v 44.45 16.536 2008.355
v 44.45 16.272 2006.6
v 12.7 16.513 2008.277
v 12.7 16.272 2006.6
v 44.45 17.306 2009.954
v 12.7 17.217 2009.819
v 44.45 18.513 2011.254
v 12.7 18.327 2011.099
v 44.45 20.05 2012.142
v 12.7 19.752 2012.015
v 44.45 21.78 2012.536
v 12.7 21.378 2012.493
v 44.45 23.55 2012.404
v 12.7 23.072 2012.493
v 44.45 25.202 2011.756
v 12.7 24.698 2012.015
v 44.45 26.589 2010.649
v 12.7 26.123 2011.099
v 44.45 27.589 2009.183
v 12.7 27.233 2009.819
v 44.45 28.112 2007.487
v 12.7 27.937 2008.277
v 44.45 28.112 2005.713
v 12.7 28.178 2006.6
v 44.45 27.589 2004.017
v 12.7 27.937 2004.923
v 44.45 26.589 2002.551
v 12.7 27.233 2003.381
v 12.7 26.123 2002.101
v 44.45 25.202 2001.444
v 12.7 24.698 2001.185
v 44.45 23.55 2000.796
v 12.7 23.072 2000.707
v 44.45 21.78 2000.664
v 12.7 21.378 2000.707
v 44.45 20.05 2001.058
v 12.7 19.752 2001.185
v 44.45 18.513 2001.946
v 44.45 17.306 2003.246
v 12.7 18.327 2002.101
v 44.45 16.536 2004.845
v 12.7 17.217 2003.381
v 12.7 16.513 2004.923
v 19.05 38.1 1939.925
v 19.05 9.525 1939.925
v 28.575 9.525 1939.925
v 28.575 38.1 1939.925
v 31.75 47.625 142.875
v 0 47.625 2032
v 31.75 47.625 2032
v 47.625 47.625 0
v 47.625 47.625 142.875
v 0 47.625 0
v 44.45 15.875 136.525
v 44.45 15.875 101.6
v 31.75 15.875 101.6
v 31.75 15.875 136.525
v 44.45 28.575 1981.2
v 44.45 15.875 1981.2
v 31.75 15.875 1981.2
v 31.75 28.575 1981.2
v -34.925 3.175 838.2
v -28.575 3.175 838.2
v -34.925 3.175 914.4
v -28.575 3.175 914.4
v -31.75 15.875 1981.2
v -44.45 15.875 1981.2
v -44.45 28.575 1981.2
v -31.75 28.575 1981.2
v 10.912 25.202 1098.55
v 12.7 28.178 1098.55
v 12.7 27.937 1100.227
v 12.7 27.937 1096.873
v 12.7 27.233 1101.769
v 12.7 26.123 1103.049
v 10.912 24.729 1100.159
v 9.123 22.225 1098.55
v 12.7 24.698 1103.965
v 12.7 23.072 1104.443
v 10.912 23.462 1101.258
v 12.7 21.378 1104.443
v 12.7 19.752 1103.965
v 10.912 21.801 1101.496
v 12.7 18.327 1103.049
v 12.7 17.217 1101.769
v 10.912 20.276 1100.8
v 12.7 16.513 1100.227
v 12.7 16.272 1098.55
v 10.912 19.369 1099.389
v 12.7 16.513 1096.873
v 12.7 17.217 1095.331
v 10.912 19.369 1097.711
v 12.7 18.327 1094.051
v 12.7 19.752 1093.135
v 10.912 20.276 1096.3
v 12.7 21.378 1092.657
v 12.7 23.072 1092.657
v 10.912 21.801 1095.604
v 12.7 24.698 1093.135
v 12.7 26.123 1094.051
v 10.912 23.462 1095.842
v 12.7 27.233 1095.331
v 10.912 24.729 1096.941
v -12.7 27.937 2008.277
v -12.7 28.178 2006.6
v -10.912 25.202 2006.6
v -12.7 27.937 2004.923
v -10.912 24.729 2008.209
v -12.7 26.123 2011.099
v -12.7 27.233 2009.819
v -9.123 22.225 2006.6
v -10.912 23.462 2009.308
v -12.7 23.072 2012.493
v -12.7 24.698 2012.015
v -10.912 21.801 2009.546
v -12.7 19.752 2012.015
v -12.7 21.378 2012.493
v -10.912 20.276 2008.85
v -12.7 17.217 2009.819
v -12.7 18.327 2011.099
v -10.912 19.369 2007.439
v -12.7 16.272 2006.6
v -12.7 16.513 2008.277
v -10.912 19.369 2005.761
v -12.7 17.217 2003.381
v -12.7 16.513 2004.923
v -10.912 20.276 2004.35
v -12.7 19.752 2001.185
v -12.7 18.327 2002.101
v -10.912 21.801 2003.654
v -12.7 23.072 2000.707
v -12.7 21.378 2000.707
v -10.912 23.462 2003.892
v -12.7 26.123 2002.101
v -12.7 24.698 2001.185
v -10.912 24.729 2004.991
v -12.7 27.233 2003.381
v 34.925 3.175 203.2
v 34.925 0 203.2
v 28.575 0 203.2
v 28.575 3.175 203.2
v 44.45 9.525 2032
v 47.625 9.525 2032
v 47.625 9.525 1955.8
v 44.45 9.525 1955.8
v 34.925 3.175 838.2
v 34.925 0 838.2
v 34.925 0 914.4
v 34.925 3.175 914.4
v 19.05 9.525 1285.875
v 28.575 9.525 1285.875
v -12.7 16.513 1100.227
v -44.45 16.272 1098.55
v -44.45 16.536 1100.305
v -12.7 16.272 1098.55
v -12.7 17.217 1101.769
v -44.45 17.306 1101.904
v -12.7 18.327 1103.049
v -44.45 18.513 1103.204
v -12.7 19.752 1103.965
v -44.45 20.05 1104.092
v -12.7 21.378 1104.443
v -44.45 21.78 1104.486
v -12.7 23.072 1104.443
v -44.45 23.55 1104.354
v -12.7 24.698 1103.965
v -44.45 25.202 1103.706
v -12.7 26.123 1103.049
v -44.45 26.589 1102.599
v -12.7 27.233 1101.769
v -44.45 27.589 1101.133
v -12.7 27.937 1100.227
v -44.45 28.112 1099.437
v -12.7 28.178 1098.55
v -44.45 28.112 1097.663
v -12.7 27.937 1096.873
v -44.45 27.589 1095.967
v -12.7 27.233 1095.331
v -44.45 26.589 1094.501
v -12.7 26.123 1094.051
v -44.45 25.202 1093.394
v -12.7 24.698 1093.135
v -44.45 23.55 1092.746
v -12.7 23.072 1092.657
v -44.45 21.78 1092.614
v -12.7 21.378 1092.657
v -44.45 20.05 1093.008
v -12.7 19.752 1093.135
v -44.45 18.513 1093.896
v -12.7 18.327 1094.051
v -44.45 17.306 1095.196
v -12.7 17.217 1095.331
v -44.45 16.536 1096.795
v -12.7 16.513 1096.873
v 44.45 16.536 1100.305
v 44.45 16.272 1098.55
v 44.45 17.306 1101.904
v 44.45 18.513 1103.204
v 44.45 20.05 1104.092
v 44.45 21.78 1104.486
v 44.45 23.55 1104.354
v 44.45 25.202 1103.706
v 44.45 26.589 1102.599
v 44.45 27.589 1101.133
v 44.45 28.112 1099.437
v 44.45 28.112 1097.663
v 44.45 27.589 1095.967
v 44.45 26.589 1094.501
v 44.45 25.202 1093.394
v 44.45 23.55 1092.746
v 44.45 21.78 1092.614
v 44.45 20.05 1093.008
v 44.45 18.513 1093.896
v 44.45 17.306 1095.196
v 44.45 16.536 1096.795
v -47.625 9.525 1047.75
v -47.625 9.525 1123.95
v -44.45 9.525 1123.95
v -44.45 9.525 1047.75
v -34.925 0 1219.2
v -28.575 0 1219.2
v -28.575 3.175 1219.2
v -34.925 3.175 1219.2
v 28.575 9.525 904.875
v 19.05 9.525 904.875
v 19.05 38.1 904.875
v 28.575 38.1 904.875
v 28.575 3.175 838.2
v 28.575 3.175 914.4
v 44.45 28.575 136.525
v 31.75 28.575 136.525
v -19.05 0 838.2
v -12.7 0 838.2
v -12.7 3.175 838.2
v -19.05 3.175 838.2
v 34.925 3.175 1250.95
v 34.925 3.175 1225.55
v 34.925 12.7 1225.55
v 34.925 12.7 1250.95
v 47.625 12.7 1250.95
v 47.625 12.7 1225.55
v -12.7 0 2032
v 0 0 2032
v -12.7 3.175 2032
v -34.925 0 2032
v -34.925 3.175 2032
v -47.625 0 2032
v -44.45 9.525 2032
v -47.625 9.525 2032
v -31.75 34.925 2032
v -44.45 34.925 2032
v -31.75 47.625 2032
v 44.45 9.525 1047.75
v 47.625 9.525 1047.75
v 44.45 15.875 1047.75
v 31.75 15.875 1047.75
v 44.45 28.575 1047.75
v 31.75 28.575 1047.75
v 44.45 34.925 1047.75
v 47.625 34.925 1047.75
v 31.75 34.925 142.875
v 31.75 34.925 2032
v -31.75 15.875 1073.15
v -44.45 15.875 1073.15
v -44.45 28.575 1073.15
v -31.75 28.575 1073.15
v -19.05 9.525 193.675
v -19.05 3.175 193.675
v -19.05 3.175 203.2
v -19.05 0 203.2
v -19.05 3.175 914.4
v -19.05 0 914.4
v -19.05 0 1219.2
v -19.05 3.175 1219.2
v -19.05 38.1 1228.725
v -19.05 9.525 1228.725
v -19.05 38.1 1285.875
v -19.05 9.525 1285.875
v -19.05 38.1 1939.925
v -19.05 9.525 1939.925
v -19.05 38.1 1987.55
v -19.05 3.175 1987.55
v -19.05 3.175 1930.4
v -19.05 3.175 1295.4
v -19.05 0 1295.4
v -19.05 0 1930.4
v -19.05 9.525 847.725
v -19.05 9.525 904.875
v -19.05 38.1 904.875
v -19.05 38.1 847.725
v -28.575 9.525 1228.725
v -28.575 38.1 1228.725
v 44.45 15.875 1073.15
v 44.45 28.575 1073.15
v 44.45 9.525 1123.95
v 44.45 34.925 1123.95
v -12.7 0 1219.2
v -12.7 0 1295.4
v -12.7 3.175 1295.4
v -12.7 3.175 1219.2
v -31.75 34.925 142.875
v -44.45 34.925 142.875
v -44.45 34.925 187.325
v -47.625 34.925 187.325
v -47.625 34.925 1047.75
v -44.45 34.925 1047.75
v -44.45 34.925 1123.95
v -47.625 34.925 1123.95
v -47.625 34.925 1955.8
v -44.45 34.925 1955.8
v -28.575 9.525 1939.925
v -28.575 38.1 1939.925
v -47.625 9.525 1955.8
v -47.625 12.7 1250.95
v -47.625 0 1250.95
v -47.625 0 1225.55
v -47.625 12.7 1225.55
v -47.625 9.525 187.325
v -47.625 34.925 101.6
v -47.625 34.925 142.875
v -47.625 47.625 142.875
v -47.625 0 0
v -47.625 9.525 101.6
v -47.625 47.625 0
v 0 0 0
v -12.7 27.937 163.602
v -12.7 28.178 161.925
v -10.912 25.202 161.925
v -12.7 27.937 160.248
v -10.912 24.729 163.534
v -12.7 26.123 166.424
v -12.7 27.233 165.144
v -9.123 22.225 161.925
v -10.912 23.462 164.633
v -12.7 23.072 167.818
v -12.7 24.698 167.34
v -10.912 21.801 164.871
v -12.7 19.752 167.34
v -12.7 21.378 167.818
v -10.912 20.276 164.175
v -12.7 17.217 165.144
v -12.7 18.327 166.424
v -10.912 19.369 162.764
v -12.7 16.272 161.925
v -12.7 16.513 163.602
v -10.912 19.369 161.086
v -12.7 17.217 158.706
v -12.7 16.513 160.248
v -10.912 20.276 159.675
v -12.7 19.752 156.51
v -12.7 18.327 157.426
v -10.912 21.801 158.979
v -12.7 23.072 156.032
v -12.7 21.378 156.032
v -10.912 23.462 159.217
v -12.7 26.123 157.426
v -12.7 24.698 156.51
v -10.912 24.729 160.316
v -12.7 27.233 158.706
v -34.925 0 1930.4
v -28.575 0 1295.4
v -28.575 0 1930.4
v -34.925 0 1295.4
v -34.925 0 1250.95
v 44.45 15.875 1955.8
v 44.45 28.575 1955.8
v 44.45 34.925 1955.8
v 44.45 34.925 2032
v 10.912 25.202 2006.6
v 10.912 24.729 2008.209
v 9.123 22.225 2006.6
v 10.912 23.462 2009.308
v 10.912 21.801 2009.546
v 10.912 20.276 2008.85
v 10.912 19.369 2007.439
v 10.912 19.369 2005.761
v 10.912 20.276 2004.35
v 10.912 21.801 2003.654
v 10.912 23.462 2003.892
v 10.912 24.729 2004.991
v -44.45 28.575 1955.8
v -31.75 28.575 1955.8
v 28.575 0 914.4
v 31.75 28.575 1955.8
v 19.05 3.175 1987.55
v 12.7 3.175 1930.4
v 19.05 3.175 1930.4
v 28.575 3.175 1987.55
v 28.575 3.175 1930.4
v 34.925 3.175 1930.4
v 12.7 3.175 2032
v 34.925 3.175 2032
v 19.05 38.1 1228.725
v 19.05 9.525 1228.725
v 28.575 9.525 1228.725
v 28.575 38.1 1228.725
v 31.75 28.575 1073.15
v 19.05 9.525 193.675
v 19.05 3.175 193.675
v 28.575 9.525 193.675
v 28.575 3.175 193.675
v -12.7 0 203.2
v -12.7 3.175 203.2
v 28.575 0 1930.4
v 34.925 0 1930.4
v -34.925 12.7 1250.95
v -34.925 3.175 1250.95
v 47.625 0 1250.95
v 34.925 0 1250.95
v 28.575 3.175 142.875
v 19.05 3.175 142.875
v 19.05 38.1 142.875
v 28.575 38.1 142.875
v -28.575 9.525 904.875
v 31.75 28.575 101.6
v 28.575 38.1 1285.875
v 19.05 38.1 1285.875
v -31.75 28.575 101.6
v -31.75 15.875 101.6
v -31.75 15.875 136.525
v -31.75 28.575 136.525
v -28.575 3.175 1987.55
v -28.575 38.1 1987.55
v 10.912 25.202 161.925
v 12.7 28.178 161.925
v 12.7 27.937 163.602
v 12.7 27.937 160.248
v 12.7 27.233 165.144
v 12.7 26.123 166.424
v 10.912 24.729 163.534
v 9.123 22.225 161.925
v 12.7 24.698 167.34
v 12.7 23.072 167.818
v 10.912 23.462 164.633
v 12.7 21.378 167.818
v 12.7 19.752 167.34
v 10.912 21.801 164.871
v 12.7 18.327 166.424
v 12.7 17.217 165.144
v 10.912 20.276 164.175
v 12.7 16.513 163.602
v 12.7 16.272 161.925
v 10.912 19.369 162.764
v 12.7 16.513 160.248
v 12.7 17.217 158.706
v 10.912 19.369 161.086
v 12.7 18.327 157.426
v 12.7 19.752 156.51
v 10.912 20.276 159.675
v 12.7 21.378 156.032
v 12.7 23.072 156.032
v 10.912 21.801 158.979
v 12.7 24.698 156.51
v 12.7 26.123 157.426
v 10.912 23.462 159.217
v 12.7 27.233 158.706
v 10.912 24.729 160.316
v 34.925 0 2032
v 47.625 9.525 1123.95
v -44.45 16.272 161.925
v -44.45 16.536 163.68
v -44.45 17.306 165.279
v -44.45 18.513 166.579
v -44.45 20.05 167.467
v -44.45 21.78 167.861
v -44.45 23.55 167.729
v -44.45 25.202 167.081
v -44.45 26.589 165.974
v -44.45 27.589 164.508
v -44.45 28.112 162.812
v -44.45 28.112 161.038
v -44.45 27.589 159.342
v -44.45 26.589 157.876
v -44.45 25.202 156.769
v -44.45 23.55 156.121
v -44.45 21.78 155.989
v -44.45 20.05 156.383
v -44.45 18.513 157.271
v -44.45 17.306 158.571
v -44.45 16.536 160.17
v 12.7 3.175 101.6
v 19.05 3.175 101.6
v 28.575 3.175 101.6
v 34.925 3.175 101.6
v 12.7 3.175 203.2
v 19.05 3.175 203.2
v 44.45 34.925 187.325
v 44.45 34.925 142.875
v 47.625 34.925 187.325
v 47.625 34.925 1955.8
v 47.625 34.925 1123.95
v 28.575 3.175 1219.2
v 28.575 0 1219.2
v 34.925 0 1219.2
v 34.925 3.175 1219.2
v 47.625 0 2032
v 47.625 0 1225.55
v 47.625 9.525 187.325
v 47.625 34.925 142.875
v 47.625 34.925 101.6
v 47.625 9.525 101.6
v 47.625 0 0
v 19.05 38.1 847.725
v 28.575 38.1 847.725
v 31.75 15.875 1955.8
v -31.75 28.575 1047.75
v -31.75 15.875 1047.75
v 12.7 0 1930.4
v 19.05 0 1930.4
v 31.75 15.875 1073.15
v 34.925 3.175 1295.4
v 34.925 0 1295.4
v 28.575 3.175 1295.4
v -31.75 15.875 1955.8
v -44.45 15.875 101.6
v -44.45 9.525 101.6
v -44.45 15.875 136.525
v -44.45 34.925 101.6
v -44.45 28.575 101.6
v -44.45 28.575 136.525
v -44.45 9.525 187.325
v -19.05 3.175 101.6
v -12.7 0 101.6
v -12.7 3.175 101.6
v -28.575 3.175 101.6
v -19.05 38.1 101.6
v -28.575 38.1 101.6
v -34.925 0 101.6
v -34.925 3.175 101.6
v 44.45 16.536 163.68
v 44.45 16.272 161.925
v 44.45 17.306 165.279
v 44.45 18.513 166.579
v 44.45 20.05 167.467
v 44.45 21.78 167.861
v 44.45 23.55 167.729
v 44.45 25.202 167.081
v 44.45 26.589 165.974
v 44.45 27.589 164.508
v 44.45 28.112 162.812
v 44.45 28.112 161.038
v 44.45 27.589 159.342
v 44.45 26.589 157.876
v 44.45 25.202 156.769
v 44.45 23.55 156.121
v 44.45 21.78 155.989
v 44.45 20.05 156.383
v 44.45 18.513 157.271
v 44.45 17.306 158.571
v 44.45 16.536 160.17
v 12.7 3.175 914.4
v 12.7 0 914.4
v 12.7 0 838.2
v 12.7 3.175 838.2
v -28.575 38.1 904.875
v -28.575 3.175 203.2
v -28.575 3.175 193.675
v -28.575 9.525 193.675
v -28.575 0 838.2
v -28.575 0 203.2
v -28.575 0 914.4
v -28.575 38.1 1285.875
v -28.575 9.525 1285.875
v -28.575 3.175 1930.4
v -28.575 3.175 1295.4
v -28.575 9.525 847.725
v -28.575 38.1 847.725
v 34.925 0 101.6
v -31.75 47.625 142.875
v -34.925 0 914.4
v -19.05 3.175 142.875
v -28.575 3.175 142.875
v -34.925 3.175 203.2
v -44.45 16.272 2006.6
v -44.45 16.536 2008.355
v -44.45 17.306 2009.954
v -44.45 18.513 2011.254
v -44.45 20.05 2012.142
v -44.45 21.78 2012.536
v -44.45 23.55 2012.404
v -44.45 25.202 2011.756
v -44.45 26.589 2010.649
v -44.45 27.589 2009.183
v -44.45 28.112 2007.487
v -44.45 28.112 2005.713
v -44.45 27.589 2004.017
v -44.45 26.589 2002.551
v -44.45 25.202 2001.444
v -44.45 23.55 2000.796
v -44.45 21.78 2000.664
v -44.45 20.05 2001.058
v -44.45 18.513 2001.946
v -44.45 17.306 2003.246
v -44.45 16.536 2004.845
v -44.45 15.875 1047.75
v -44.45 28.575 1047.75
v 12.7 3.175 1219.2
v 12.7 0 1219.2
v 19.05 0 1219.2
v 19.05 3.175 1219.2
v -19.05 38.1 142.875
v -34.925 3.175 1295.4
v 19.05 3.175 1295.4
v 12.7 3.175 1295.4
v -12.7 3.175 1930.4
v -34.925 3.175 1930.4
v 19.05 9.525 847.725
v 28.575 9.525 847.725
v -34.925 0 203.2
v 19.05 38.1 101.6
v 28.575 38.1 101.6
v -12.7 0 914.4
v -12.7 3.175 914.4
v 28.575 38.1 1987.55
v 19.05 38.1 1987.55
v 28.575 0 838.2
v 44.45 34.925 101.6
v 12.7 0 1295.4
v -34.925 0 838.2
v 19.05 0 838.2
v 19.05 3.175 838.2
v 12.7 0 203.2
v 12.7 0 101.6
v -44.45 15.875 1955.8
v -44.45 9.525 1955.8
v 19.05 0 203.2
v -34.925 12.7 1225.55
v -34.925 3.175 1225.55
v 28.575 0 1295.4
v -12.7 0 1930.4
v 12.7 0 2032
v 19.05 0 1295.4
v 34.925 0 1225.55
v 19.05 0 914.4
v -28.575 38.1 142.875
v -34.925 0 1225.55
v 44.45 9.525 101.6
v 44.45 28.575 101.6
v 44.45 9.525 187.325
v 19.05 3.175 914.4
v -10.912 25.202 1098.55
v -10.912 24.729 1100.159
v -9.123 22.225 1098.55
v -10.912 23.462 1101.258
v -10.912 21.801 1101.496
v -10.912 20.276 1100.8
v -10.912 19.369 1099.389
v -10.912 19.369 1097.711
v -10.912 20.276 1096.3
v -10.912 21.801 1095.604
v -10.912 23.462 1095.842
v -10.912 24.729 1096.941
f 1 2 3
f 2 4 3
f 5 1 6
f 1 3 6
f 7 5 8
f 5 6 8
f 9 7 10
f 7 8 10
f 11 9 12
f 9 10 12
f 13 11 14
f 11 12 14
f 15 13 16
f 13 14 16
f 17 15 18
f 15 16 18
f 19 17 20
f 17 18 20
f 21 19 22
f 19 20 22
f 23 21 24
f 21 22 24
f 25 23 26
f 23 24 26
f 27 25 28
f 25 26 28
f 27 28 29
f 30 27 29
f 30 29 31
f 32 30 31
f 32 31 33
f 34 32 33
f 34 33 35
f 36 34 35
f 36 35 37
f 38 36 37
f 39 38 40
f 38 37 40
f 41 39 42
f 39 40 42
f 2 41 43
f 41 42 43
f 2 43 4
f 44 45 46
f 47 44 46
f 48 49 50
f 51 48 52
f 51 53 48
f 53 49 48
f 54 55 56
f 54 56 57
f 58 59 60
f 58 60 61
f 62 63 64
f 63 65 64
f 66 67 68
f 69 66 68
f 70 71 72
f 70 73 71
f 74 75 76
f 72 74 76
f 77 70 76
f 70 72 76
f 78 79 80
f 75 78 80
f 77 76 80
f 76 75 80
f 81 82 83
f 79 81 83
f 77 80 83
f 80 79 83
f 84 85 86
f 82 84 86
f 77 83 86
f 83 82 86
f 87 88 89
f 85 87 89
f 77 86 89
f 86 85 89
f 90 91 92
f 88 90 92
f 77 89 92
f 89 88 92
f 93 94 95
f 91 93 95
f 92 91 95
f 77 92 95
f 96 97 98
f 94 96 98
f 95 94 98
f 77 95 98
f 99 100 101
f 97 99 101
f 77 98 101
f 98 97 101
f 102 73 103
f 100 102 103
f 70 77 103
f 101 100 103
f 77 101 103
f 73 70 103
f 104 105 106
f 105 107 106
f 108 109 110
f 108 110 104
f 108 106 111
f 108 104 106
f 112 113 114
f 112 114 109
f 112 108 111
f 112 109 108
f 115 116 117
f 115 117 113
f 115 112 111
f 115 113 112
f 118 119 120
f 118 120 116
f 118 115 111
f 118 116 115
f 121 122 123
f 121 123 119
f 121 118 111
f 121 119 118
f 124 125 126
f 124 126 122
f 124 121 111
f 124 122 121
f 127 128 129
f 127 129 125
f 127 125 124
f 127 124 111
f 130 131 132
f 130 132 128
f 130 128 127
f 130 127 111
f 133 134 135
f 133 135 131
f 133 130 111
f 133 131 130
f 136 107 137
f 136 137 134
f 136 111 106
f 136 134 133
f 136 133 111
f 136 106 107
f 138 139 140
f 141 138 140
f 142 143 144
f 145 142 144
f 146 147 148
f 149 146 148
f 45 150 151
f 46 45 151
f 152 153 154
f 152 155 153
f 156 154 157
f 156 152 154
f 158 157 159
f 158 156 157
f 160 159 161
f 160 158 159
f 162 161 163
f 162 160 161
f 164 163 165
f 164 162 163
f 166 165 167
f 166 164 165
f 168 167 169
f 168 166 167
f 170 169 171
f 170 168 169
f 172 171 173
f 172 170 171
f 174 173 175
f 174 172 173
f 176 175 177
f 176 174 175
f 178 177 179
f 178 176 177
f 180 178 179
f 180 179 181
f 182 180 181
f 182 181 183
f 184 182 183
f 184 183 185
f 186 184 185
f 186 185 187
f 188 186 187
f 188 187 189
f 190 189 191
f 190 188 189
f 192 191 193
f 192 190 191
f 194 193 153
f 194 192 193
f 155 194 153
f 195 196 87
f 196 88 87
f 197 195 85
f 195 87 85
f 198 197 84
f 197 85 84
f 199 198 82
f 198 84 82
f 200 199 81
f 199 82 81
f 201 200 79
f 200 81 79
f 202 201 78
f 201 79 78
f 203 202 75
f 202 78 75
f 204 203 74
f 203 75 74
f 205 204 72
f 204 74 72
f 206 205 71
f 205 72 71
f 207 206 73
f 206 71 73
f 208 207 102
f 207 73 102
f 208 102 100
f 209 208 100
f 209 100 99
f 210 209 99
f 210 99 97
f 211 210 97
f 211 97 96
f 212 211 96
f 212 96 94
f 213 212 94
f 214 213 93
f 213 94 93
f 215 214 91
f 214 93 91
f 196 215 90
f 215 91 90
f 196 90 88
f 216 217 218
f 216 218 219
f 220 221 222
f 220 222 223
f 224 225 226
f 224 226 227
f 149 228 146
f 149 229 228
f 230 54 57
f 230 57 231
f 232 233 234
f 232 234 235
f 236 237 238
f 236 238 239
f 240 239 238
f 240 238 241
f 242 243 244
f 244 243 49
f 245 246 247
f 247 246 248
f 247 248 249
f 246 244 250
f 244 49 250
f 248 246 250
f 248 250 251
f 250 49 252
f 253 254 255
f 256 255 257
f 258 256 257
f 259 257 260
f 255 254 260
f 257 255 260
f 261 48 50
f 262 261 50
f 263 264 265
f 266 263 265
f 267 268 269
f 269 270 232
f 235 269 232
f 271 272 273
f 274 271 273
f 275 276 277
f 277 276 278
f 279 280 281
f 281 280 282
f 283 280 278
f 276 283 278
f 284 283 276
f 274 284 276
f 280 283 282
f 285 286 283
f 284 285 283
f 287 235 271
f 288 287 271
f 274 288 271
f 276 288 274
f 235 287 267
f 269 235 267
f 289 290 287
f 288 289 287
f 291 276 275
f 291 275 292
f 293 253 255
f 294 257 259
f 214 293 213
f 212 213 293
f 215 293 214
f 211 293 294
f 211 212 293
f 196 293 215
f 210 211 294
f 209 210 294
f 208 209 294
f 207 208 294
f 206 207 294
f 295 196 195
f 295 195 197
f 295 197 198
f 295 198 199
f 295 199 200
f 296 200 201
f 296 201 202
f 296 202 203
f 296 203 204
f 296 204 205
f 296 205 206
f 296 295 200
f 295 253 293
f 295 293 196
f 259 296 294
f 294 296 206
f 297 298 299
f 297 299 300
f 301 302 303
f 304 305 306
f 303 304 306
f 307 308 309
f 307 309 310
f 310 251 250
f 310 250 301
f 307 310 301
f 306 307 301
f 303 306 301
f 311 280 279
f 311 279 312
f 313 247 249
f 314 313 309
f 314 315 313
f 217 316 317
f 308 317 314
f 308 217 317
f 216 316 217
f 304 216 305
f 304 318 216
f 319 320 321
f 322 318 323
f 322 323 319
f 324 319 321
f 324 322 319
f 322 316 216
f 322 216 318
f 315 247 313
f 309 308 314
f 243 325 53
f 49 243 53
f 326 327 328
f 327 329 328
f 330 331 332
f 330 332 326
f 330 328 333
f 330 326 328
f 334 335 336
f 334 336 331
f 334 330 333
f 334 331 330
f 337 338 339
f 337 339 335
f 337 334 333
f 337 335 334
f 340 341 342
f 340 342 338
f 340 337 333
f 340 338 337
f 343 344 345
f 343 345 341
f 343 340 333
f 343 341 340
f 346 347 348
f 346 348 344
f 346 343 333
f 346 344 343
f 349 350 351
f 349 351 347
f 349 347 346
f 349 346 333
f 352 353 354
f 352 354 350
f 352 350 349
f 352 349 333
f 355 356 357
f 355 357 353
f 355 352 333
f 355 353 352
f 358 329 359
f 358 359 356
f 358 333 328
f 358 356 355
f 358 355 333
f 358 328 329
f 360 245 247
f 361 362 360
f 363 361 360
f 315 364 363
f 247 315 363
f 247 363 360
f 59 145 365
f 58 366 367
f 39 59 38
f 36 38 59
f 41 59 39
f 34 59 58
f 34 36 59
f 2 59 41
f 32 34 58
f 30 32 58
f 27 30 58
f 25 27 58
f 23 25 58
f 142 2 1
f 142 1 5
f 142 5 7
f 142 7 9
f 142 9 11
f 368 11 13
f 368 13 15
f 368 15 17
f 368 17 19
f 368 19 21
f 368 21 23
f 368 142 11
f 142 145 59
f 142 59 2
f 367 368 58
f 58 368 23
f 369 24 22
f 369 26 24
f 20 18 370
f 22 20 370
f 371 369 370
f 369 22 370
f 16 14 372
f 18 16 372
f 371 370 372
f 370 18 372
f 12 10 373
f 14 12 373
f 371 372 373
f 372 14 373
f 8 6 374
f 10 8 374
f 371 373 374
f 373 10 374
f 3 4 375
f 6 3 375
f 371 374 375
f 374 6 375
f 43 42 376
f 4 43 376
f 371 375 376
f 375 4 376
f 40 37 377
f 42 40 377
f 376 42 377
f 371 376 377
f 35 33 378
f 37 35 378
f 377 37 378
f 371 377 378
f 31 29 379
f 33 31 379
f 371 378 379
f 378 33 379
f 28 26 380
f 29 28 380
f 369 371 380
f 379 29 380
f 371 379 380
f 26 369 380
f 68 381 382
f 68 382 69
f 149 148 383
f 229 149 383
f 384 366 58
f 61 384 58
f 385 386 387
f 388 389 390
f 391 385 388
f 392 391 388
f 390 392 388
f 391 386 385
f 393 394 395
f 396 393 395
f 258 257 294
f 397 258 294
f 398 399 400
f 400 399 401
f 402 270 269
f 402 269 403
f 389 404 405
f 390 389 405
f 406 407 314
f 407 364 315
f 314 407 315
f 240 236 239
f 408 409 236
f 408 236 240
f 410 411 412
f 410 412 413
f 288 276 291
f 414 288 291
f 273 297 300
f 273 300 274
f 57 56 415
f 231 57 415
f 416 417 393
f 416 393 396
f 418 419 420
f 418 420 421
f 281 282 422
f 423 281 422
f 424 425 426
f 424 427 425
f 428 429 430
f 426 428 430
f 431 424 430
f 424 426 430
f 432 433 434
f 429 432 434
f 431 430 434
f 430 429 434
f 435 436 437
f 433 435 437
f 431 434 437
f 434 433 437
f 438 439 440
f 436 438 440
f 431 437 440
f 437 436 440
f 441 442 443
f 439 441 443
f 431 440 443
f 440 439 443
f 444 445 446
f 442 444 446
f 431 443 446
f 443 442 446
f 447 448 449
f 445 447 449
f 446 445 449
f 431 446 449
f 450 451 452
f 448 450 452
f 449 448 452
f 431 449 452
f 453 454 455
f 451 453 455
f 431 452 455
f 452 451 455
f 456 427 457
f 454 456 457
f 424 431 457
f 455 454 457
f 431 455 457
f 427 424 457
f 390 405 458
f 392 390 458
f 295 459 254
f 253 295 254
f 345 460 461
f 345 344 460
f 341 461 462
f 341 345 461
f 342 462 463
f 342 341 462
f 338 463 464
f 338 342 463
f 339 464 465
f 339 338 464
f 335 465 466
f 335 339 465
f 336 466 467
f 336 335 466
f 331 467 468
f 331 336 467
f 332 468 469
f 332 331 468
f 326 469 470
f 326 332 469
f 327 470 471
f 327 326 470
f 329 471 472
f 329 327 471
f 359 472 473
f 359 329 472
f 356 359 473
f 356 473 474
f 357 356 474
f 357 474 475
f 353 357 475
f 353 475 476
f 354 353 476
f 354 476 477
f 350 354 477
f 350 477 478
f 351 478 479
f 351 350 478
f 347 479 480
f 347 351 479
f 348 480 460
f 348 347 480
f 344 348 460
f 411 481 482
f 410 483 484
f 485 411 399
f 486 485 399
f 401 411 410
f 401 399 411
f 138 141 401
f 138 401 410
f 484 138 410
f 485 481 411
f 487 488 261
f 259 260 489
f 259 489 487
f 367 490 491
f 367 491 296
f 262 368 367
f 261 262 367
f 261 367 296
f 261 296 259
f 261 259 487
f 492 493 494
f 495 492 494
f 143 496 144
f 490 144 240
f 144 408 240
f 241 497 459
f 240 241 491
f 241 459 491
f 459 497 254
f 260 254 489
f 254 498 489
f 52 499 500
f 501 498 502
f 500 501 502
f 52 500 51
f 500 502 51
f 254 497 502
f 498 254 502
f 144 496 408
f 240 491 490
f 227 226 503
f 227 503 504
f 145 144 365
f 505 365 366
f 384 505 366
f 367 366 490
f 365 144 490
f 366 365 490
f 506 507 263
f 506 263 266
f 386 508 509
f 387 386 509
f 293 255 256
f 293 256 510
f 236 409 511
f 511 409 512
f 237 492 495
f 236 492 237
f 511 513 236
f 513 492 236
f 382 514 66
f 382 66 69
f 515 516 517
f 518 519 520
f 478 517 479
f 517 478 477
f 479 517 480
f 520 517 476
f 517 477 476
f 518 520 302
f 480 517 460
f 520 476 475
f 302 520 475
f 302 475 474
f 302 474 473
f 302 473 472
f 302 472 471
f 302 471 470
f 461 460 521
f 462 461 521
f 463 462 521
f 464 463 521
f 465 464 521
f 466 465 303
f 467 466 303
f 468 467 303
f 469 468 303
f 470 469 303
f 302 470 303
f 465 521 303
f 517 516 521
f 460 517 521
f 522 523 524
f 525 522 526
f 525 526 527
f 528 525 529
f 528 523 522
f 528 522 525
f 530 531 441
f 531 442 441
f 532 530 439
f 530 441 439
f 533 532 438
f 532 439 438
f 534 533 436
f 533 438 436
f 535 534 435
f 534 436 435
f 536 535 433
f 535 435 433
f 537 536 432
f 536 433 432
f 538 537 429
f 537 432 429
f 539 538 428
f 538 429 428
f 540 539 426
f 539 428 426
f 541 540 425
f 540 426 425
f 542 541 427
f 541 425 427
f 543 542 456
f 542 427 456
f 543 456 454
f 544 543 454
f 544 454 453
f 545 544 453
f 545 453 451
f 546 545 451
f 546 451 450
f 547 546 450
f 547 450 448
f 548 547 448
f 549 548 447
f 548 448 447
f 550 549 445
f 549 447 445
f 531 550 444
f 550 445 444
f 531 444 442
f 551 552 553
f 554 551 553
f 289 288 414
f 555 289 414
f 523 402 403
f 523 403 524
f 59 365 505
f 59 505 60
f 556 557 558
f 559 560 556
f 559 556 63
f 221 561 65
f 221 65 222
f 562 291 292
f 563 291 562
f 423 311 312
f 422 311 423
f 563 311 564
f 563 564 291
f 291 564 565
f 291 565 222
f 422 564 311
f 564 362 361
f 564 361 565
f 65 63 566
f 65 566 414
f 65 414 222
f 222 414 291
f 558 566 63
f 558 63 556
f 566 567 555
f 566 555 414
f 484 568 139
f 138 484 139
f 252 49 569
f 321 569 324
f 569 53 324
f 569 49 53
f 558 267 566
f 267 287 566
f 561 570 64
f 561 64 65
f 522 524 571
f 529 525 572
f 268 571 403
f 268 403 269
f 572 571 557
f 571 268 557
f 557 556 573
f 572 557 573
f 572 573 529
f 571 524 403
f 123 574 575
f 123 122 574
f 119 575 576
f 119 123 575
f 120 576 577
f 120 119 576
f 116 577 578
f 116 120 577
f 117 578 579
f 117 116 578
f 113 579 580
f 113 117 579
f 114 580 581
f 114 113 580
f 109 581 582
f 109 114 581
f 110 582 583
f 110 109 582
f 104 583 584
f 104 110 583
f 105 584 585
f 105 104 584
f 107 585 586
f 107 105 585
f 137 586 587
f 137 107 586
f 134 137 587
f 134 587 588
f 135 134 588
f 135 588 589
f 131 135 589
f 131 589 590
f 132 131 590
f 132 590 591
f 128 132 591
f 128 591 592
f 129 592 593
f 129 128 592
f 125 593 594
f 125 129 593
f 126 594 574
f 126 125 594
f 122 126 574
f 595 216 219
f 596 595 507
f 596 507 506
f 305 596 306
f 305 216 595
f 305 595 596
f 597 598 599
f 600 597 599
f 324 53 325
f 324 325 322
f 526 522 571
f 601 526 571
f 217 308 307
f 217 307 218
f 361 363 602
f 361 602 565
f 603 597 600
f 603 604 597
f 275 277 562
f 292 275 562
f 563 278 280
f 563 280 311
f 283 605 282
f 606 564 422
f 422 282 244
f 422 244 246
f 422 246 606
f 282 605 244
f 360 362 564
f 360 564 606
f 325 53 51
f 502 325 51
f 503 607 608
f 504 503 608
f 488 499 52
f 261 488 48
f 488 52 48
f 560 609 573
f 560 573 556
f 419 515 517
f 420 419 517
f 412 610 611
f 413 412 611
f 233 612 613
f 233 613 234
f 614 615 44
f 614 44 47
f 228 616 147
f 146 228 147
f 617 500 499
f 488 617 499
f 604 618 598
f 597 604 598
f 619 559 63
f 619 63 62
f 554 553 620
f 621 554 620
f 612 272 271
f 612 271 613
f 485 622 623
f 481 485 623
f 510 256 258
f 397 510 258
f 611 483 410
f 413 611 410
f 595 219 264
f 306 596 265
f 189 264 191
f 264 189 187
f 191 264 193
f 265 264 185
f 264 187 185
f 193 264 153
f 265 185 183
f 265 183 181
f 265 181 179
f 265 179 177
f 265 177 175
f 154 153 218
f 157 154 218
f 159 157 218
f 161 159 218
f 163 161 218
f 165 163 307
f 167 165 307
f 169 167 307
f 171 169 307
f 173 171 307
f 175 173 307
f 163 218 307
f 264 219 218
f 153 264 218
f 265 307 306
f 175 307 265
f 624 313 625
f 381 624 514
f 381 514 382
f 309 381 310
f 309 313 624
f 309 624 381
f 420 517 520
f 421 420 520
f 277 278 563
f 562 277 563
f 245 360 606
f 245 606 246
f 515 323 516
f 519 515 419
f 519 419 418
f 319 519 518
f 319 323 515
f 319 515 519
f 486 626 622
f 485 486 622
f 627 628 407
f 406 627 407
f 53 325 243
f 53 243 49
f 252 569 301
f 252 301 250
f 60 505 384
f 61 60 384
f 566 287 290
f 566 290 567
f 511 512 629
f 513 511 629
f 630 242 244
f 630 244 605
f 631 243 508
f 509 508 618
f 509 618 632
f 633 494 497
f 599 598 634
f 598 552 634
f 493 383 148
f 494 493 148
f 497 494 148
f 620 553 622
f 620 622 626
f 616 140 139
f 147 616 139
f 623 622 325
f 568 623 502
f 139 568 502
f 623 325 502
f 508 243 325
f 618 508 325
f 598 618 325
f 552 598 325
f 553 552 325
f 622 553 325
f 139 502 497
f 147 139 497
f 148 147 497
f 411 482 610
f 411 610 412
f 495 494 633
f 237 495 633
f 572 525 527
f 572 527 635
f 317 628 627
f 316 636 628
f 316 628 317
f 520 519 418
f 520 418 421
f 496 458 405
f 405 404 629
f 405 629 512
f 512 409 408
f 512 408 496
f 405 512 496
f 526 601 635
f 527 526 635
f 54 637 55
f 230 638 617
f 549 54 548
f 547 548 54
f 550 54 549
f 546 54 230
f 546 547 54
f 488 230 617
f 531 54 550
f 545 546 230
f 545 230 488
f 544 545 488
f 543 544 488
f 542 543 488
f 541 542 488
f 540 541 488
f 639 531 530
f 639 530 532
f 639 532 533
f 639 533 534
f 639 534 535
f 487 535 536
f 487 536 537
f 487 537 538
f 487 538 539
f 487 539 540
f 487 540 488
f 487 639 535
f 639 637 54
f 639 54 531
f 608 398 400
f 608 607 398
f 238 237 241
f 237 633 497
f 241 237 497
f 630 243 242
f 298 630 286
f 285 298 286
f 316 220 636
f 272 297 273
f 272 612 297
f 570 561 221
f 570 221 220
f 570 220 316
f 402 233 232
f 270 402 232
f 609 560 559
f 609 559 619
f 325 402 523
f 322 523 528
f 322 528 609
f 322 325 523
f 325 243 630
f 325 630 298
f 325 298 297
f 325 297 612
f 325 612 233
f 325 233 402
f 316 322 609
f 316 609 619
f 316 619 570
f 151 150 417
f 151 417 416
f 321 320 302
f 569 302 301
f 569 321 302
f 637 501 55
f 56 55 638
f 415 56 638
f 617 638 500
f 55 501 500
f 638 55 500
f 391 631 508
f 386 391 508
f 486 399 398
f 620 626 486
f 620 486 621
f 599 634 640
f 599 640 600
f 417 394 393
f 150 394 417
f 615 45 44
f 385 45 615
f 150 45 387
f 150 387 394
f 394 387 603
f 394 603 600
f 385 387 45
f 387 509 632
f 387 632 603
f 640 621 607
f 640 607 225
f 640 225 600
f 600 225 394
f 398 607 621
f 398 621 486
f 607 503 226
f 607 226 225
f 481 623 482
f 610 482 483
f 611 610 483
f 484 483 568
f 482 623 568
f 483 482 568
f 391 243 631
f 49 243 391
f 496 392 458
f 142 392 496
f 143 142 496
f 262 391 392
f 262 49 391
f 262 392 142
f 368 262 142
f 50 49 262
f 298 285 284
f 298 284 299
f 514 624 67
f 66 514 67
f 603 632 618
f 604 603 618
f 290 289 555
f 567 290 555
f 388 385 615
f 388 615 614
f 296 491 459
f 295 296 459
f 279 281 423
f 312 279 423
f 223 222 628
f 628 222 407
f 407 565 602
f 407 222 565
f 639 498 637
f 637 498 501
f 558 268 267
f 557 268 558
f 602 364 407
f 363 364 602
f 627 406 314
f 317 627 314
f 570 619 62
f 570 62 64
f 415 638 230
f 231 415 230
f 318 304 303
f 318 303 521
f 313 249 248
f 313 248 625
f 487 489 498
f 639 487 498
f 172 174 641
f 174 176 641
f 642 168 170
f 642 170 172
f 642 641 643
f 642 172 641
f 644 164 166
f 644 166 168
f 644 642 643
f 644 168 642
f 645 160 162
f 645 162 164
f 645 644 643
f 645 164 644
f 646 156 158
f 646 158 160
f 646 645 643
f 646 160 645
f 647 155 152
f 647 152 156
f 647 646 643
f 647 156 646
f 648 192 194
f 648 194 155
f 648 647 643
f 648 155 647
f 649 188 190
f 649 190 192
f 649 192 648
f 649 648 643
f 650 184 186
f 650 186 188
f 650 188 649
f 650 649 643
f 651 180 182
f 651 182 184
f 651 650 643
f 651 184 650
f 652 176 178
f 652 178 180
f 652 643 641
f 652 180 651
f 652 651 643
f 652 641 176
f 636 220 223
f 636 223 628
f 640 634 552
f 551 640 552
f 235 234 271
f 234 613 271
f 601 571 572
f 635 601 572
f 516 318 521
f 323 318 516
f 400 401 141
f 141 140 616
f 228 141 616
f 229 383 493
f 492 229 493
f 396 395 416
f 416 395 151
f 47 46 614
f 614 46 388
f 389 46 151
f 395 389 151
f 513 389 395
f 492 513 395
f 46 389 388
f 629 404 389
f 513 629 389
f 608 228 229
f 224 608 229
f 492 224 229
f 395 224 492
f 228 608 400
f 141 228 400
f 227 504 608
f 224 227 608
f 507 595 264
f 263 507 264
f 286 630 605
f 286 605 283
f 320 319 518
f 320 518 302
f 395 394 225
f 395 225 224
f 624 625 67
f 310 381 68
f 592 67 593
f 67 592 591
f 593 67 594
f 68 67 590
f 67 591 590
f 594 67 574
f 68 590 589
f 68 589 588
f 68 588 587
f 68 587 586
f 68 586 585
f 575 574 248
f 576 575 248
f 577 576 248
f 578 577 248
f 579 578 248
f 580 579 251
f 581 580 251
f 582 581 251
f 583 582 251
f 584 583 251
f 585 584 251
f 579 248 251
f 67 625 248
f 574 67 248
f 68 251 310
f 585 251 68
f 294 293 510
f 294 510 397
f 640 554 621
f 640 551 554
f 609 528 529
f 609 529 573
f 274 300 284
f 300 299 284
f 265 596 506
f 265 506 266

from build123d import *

# Parameters (mm, degrees)
F0_W      = 47.625
F0_H      = 47.625
F1_DEPTH  = 2032
F2_W      = 9.525
F2_H      = 41.275
F2_H_2    = 47.625
F2_H_3    = 57.15
F3_DEPTH  = 38.1
F2_H_4    = 9.525
F2_H_5    = 635
F2_H_6    = 304.8
F4_DEPTH  = 9.525
F2_H_7    = 44.45
F5_DEPTH  = 3.175
F7_D      = 11.90625
F7_DEPTH  = 34.925
F7_TIP    = 3.5769983726
F6_W      = 12.7
F6_H      = 25.4
F6_H_2    = 34.925
F8_DEPTH  = 15.875
F9_DEPTH  = 3.175
F10_W     = 15.875
F10_H     = 1889.125
F11_DEPTH = 12.7
F12_W     = 12.7
F12_H     = 25.4
F13_DEPTH = 12.7


with BuildPart() as f1:
    # F0 (on Top) → F1 (new body)
    with BuildSketch(Plane.XY):
        with Locations((23.8125, 23.8125)):
            Rectangle(F0_W, F0_H)
    extrude(amount=F1_DEPTH)

    # F2 (on face) → F3 (cut)
    with BuildSketch(Plane.XZ):
        with Locations((23.8125, 122.2375)):
            Rectangle(F2_W, F2_H)
        with Locations((23.8125, 1963.7375)):
            Rectangle(F2_W, F2_H_2)
        with Locations((23.8125, 876.3)):
            Rectangle(F2_W, F2_H_3)
        with Locations((23.8125, 1257.3)):
            Rectangle(F2_W, F2_H_3)
    extrude(amount=-F3_DEPTH, mode=Mode.SUBTRACT)

    # F2 (on face) → F4 (cut)
    with BuildSketch(Plane.XZ):
        with Locations((23.8125, 198.4375)):
            Rectangle(F2_W, F2_H_4)
        with Locations((23.8125, 520.7)):
            Rectangle(F2_W, F2_H_5)
        with Locations((23.8125, 1066.8)):
            Rectangle(F2_W, F2_H_6)
        with Locations((23.8125, 1612.9)):
            Rectangle(F2_W, F2_H_5)
        with Locations((23.8125, 1935.1625)):
            Rectangle(F2_W, F2_H_4)
        with Locations((23.8125, 1223.9625)):
            Rectangle(F2_W, F2_H_4)
        with Locations((23.8125, 842.9625)):
            Rectangle(F2_W, F2_H_4)
        with Locations((23.8125, 1290.6375)):
            Rectangle(F2_W, F2_H_4)
        with Locations((23.8125, 909.6375)):
            Rectangle(F2_W, F2_H_4)
    extrude(amount=-F4_DEPTH, mode=Mode.SUBTRACT)

    # F2 (on face) → F5 (cut)
    with BuildSketch(Plane.XZ):
        Polygon((12.7, 1930.4), (19.05, 1930.4), (19.05, 1939.925), (19.05, 1987.55), (19.05, 2032), (12.7, 2032), align=None)
        with Locations((23.8125, 2009.775)):
            Rectangle(F2_W, F2_H_7)
        Polygon((28.575, 1939.925), (28.575, 1930.4), (34.925, 1930.4), (34.925, 2032), (28.575, 2032), (28.575, 1987.55), align=None)
        Polygon((12.7, 1219.2), (19.05, 1219.2), (19.05, 1228.725), (19.05, 1285.875), (19.05, 1295.4), (12.7, 1295.4), align=None)
        Polygon((28.575, 1228.725), (28.575, 1219.2), (34.925, 1219.2), (34.925, 1295.4), (28.575, 1295.4), (28.575, 1285.875), align=None)
        Polygon((12.7, 838.2), (19.05, 838.2), (19.05, 847.725), (19.05, 904.875), (19.05, 914.4), (12.7, 914.4), align=None)
        Polygon((28.575, 847.725), (28.575, 838.2), (34.925, 838.2), (34.925, 914.4), (28.575, 914.4), (28.575, 904.875), align=None)
        Polygon((34.925, 101.6), (34.925, 203.2), (28.575, 203.2), (28.575, 193.675), (19.05, 193.675), (19.05, 203.2), (12.7, 203.2), (12.7, 101.6), (19.05, 101.6), (19.05, 142.875), (28.575, 142.875), (28.575, 101.6), align=None)
    extrude(amount=-F5_DEPTH, mode=Mode.SUBTRACT)

    # F7
    with Locations(Plane.YZ.offset(47.625)):
        with Locations((22.225, 2006.6), (22.225, 161.925), (22.225, 1098.55)):
            Hole(F7_D / 2, depth=F7_DEPTH)
            with Locations((0, 0, -(F7_DEPTH + F7_TIP / 2))):  # 118° drill point
                Cone(0, F7_D / 2, F7_TIP, mode=Mode.SUBTRACT)

    # F6 (on face) → F8 (cut)
    with BuildSketch(Plane.YZ.offset(47.625)):
        with Locations((22.225, 1968.5)):
            Rectangle(F6_W, F6_H)
        with Locations((22.225, 119.0625)):
            Rectangle(F6_W, F6_H_2)
        with Locations((22.225, 1060.45)):
            Rectangle(F6_W, F6_H)
    extrude(amount=-F8_DEPTH, mode=Mode.SUBTRACT)

    # F6 (on face) → F9 (cut)
    with BuildSketch(Plane.YZ.offset(47.625)):
        Polygon((28.575, 101.6), (34.925, 101.6), (34.925, 187.325), (9.525, 187.325), (9.525, 101.6), (15.875, 101.6), (15.875, 136.525), (28.575, 136.525), align=None)
        Polygon((9.525, 2032), (9.525, 1955.8), (15.875, 1955.8), (15.875, 1981.2), (28.575, 1981.2), (28.575, 1955.8), (34.925, 1955.8), (34.925, 2032), align=None)
        Polygon((9.525, 1123.95), (9.525, 1047.75), (15.875, 1047.75), (15.875, 1073.15), (28.575, 1073.15), (28.575, 1047.75), (34.925, 1047.75), (34.925, 1123.95), align=None)
    extrude(amount=-F9_DEPTH, mode=Mode.SUBTRACT)

    # F10 (on face) → F11 (cut)
    with BuildSketch(Plane(origin=(0, 47.625, 0), x_dir=(-1, 0, 0), z_dir=(0, 1, 0))):
        with Locations((-39.6875, 1087.4375)):
            Rectangle(F10_W, F10_H)
    extrude(amount=-F11_DEPTH, mode=Mode.SUBTRACT)

    # F12 (on face) → F13 (cut)
    with BuildSketch(Plane.XZ):
        with Locations((41.275, 1238.25)):
            Rectangle(F12_W, F12_H)
    extrude(amount=-F13_DEPTH, mode=Mode.SUBTRACT)


with BuildPart() as f14_1:
    # F14: instance of F1
    add(f1.part.mirror(Plane.YZ))


solid = Compound([f1.part, f14_1.part])
